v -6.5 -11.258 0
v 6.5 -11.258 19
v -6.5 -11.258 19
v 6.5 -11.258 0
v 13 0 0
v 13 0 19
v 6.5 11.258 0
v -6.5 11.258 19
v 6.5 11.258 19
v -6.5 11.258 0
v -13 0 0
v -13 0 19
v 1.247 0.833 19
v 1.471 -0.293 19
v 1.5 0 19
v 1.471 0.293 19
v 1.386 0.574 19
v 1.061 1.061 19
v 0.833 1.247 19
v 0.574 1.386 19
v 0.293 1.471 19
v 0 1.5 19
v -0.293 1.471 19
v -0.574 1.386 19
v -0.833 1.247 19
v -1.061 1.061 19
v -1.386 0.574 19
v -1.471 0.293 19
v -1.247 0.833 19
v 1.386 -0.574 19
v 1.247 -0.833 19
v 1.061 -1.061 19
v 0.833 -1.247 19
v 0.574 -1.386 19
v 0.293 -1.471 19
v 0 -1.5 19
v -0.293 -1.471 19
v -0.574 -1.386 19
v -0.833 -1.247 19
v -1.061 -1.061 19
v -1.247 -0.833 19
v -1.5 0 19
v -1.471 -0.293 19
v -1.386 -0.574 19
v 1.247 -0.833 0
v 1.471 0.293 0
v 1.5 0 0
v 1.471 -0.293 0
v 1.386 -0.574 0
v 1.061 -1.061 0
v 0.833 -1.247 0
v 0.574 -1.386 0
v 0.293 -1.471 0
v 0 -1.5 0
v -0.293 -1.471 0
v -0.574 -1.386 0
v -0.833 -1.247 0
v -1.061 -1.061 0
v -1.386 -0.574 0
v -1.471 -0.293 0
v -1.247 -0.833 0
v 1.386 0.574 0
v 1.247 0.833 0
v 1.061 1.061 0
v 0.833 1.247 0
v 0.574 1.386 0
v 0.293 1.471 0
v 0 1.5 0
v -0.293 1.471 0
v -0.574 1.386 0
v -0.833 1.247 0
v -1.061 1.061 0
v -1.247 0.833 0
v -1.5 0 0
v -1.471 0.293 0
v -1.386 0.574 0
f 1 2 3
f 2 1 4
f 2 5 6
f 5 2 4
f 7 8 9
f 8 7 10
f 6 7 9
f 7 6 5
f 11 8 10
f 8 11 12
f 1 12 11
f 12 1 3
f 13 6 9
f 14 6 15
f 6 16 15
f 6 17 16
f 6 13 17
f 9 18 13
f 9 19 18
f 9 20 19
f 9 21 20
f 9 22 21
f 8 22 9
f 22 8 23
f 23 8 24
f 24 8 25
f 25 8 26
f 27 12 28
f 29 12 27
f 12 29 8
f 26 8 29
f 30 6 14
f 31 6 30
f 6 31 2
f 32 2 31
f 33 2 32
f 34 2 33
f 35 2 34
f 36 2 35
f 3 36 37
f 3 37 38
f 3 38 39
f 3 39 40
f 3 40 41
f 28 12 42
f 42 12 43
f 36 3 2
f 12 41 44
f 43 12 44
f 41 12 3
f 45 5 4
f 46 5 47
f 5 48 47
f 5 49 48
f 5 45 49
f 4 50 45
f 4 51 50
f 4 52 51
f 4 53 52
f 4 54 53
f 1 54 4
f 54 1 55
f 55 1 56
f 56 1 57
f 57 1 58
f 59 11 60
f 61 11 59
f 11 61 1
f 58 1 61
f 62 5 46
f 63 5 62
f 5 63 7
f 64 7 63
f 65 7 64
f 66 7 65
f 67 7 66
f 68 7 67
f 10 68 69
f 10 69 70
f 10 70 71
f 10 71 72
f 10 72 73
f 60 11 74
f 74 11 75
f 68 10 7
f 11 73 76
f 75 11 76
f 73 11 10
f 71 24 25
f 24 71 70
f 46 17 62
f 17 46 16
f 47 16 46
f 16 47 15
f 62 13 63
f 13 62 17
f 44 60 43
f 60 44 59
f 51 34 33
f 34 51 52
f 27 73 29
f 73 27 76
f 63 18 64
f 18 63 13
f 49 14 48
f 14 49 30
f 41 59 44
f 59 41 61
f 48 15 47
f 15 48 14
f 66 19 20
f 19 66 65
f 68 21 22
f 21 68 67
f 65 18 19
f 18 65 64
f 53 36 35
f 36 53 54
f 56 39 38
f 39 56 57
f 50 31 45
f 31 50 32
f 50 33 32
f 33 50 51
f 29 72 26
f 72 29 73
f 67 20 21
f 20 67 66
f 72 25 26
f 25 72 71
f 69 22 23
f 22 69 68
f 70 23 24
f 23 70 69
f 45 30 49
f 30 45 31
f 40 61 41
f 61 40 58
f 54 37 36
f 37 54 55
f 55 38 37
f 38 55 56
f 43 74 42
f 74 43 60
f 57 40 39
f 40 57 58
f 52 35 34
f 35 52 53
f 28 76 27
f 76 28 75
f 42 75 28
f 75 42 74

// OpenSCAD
$fn=32;
difference() {
    cylinder($fn=6, h=19, d=26);
    translate([0,0,-1]) cylinder(h=21, d=3);
}
